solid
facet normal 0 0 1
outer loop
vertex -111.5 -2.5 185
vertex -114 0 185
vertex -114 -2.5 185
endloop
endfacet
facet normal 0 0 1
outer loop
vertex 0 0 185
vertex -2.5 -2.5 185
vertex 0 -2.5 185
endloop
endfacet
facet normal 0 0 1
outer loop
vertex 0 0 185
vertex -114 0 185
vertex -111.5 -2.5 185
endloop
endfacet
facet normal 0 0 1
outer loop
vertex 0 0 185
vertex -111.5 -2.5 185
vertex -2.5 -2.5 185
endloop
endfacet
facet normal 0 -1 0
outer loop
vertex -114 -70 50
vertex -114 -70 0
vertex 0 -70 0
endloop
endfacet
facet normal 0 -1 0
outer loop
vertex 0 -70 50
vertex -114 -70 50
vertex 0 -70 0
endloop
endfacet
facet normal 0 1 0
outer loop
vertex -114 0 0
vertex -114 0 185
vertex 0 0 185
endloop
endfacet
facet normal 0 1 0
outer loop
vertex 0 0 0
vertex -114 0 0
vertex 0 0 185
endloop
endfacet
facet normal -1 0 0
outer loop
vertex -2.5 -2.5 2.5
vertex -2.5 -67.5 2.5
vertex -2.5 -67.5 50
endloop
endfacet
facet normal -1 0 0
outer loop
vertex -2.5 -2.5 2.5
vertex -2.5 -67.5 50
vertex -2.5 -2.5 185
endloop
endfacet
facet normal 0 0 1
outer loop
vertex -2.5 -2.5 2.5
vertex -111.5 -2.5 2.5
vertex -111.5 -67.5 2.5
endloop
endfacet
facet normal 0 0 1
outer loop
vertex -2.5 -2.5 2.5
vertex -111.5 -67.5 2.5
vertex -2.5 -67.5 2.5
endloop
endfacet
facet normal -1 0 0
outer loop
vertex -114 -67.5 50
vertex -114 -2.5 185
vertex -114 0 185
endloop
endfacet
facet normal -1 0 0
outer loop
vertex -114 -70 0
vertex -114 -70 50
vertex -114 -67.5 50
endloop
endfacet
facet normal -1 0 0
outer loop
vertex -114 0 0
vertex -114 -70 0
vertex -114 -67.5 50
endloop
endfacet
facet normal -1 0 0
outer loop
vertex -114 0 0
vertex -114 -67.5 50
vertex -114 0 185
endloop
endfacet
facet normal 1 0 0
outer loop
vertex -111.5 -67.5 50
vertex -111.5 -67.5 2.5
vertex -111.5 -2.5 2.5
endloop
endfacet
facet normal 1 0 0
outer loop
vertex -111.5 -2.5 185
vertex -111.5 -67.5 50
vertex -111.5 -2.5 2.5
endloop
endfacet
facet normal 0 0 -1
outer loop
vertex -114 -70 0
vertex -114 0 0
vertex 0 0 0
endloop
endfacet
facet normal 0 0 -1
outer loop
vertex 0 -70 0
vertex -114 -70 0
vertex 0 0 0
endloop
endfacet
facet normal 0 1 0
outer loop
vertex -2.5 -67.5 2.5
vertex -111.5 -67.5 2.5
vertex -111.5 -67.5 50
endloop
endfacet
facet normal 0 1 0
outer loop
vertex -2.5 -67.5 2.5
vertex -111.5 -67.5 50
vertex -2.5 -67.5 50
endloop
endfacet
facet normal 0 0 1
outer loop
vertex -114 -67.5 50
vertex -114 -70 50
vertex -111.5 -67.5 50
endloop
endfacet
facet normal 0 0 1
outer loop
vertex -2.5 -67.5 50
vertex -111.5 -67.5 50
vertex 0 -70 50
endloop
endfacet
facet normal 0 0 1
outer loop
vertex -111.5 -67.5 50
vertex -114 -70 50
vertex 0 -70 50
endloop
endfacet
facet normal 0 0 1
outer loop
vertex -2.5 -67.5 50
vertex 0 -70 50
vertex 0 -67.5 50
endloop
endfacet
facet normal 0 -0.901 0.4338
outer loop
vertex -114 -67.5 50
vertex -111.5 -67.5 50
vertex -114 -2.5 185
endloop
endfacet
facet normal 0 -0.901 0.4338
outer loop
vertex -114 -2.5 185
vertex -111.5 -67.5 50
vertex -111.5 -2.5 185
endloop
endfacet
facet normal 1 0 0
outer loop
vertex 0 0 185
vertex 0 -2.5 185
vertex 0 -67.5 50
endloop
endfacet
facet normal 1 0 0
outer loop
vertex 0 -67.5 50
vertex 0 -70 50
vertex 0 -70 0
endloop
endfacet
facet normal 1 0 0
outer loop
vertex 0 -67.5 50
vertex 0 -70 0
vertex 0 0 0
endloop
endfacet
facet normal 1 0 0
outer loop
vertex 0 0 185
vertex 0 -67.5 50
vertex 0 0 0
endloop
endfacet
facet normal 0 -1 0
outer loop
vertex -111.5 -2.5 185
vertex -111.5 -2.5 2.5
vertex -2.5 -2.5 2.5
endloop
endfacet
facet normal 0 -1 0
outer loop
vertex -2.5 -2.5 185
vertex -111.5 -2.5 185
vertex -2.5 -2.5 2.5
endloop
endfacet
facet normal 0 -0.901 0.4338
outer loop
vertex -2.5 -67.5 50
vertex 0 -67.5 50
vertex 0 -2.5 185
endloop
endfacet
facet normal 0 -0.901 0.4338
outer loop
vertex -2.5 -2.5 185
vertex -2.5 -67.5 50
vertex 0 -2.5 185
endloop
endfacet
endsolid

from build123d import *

# Parameters (mm, degrees)
F0_W     = 114
F0_H     = 70
F1_DEPTH = 185
F5_DEPTH = 114
F3_W     = 109
F3_H     = 65
F6_DEPTH = 182.501


with BuildPart() as f1:
    # F0 (on Top) → F1 (new body)
    with BuildSketch(Plane.XY):
        with Locations((-57, -35)):
            Rectangle(F0_W, F0_H)
    extrude(amount=F1_DEPTH)

    # F4 (on Right) → F5 (cut, through all)
    with BuildSketch(Plane.YZ):
        Polygon((-70, 185), (-70, 50), (-67.5, 50), (-2.5, 185), align=None)
    extrude(amount=-F5_DEPTH, mode=Mode.SUBTRACT)

    # F3 (on offset) → F6 (cut, through all)
    with BuildSketch(Plane.XY.offset(2.5)):
        with Locations((-57, -35)):
            Rectangle(F3_W, F3_H)
    extrude(amount=F6_DEPTH, mode=Mode.SUBTRACT)


solid = f1.part
